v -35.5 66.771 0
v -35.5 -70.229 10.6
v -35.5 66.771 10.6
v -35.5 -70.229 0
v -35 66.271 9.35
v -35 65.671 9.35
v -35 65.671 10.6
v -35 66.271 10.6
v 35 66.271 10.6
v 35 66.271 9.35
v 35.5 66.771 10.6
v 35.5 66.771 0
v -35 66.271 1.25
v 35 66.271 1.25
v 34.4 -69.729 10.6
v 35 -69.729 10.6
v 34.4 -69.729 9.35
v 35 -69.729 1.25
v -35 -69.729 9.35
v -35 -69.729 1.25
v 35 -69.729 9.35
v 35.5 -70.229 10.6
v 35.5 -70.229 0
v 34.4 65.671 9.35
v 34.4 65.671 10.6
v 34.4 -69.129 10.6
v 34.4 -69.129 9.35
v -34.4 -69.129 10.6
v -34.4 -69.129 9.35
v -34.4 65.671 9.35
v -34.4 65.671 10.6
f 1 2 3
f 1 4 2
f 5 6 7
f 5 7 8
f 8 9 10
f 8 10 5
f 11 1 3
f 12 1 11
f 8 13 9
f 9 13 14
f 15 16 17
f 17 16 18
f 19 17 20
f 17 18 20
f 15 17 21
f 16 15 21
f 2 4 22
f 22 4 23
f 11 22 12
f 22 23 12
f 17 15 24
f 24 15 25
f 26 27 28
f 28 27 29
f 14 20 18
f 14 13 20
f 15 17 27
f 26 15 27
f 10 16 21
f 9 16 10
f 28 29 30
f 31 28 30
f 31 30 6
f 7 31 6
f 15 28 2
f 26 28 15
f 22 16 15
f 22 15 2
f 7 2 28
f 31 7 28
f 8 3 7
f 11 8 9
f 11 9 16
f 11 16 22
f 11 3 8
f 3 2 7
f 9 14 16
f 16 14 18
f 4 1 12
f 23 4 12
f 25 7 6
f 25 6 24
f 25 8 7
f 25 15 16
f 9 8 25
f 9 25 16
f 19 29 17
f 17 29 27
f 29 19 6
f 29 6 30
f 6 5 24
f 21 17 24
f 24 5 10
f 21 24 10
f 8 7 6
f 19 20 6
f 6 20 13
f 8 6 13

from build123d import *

# Parameters (mm, degrees)
F0_W     = 71
F0_H     = 137
F1_DEPTH = 1.25
F2_W     = 0.5
F2_H     = 0.5
F3_DEPTH = 8.1
F4_W     = 71
F4_H     = 137
F5_DEPTH = 1.25
F6_W     = 69.4
F6_H     = 0.6
F6_W_2   = 0.6
F6_H_2   = 135.4
F7_DEPTH = 1.25


with BuildPart() as f1:
    # F0 (on Top) → F1 (new body)
    with BuildSketch(Plane.XY):
        with Locations((0, -1.7288960686)):
            Rectangle(F0_W, F0_H)
    extrude(amount=F1_DEPTH)

    # F2 (on face) → F3 (join)
    with BuildSketch(Plane.XY.offset(1.25)):
        with Locations((-35.25, 66.5211039314)):
            Rectangle(F2_W, F2_H)
        with Locations((35.25, -69.9788960686)):
            Rectangle(F2_W, F2_H)
        Polygon((-35, 66.2711039314), (-35.5, 66.2711039314), (-35.5, -70.2288960686), (35, -70.2288960686), (35, -69.7288960686), (-35, -69.7288960686), align=None)
        Polygon((35.5, 66.7711039314), (-35, 66.7711039314), (-35, 66.2711039314), (35, 66.2711039314), (35, -69.7288960686), (35.5, -69.7288960686), align=None)
    extrude(amount=F3_DEPTH)

    # F4 (on face) → F5 (join)
    with BuildSketch(Plane.XY.offset(9.35)):
        with Locations((0, -1.7288960686)):
            Rectangle(F4_W, F4_H)
        Polygon((-35, 65.6711039314), (-35, 66.2711039314), (-34.4, 66.2711039314), (35, 66.2711039314), (35, -69.1288960686), (35, -69.7288960686), (34.4, -69.7288960686), (-35, -69.7288960686), align=None, mode=Mode.SUBTRACT)
        Polygon((-34.4, 65.6711039314), (-35, 65.6711039314), (-35, -69.7288960686), (34.4, -69.7288960686), (34.4, -69.1288960686), (-34.4, -69.1288960686), align=None)
    extrude(amount=F5_DEPTH)


with BuildPart() as f7:
    # F6 (on face) → F7 (new body)
    with BuildSketch(Plane.XY.offset(10.6)):
        with Locations((-0.3, 65.9711039314)):
            Rectangle(F6_W, F6_H)
        with Locations((34.7, 65.9711039314)):
            Rectangle(F6_W_2, F6_H)
        with Locations((34.7, -2.0288960686)):
            Rectangle(F6_W_2, F6_H_2)
    extrude(amount=-F7_DEPTH)


solid = Compound([f1.part, f7.part])
